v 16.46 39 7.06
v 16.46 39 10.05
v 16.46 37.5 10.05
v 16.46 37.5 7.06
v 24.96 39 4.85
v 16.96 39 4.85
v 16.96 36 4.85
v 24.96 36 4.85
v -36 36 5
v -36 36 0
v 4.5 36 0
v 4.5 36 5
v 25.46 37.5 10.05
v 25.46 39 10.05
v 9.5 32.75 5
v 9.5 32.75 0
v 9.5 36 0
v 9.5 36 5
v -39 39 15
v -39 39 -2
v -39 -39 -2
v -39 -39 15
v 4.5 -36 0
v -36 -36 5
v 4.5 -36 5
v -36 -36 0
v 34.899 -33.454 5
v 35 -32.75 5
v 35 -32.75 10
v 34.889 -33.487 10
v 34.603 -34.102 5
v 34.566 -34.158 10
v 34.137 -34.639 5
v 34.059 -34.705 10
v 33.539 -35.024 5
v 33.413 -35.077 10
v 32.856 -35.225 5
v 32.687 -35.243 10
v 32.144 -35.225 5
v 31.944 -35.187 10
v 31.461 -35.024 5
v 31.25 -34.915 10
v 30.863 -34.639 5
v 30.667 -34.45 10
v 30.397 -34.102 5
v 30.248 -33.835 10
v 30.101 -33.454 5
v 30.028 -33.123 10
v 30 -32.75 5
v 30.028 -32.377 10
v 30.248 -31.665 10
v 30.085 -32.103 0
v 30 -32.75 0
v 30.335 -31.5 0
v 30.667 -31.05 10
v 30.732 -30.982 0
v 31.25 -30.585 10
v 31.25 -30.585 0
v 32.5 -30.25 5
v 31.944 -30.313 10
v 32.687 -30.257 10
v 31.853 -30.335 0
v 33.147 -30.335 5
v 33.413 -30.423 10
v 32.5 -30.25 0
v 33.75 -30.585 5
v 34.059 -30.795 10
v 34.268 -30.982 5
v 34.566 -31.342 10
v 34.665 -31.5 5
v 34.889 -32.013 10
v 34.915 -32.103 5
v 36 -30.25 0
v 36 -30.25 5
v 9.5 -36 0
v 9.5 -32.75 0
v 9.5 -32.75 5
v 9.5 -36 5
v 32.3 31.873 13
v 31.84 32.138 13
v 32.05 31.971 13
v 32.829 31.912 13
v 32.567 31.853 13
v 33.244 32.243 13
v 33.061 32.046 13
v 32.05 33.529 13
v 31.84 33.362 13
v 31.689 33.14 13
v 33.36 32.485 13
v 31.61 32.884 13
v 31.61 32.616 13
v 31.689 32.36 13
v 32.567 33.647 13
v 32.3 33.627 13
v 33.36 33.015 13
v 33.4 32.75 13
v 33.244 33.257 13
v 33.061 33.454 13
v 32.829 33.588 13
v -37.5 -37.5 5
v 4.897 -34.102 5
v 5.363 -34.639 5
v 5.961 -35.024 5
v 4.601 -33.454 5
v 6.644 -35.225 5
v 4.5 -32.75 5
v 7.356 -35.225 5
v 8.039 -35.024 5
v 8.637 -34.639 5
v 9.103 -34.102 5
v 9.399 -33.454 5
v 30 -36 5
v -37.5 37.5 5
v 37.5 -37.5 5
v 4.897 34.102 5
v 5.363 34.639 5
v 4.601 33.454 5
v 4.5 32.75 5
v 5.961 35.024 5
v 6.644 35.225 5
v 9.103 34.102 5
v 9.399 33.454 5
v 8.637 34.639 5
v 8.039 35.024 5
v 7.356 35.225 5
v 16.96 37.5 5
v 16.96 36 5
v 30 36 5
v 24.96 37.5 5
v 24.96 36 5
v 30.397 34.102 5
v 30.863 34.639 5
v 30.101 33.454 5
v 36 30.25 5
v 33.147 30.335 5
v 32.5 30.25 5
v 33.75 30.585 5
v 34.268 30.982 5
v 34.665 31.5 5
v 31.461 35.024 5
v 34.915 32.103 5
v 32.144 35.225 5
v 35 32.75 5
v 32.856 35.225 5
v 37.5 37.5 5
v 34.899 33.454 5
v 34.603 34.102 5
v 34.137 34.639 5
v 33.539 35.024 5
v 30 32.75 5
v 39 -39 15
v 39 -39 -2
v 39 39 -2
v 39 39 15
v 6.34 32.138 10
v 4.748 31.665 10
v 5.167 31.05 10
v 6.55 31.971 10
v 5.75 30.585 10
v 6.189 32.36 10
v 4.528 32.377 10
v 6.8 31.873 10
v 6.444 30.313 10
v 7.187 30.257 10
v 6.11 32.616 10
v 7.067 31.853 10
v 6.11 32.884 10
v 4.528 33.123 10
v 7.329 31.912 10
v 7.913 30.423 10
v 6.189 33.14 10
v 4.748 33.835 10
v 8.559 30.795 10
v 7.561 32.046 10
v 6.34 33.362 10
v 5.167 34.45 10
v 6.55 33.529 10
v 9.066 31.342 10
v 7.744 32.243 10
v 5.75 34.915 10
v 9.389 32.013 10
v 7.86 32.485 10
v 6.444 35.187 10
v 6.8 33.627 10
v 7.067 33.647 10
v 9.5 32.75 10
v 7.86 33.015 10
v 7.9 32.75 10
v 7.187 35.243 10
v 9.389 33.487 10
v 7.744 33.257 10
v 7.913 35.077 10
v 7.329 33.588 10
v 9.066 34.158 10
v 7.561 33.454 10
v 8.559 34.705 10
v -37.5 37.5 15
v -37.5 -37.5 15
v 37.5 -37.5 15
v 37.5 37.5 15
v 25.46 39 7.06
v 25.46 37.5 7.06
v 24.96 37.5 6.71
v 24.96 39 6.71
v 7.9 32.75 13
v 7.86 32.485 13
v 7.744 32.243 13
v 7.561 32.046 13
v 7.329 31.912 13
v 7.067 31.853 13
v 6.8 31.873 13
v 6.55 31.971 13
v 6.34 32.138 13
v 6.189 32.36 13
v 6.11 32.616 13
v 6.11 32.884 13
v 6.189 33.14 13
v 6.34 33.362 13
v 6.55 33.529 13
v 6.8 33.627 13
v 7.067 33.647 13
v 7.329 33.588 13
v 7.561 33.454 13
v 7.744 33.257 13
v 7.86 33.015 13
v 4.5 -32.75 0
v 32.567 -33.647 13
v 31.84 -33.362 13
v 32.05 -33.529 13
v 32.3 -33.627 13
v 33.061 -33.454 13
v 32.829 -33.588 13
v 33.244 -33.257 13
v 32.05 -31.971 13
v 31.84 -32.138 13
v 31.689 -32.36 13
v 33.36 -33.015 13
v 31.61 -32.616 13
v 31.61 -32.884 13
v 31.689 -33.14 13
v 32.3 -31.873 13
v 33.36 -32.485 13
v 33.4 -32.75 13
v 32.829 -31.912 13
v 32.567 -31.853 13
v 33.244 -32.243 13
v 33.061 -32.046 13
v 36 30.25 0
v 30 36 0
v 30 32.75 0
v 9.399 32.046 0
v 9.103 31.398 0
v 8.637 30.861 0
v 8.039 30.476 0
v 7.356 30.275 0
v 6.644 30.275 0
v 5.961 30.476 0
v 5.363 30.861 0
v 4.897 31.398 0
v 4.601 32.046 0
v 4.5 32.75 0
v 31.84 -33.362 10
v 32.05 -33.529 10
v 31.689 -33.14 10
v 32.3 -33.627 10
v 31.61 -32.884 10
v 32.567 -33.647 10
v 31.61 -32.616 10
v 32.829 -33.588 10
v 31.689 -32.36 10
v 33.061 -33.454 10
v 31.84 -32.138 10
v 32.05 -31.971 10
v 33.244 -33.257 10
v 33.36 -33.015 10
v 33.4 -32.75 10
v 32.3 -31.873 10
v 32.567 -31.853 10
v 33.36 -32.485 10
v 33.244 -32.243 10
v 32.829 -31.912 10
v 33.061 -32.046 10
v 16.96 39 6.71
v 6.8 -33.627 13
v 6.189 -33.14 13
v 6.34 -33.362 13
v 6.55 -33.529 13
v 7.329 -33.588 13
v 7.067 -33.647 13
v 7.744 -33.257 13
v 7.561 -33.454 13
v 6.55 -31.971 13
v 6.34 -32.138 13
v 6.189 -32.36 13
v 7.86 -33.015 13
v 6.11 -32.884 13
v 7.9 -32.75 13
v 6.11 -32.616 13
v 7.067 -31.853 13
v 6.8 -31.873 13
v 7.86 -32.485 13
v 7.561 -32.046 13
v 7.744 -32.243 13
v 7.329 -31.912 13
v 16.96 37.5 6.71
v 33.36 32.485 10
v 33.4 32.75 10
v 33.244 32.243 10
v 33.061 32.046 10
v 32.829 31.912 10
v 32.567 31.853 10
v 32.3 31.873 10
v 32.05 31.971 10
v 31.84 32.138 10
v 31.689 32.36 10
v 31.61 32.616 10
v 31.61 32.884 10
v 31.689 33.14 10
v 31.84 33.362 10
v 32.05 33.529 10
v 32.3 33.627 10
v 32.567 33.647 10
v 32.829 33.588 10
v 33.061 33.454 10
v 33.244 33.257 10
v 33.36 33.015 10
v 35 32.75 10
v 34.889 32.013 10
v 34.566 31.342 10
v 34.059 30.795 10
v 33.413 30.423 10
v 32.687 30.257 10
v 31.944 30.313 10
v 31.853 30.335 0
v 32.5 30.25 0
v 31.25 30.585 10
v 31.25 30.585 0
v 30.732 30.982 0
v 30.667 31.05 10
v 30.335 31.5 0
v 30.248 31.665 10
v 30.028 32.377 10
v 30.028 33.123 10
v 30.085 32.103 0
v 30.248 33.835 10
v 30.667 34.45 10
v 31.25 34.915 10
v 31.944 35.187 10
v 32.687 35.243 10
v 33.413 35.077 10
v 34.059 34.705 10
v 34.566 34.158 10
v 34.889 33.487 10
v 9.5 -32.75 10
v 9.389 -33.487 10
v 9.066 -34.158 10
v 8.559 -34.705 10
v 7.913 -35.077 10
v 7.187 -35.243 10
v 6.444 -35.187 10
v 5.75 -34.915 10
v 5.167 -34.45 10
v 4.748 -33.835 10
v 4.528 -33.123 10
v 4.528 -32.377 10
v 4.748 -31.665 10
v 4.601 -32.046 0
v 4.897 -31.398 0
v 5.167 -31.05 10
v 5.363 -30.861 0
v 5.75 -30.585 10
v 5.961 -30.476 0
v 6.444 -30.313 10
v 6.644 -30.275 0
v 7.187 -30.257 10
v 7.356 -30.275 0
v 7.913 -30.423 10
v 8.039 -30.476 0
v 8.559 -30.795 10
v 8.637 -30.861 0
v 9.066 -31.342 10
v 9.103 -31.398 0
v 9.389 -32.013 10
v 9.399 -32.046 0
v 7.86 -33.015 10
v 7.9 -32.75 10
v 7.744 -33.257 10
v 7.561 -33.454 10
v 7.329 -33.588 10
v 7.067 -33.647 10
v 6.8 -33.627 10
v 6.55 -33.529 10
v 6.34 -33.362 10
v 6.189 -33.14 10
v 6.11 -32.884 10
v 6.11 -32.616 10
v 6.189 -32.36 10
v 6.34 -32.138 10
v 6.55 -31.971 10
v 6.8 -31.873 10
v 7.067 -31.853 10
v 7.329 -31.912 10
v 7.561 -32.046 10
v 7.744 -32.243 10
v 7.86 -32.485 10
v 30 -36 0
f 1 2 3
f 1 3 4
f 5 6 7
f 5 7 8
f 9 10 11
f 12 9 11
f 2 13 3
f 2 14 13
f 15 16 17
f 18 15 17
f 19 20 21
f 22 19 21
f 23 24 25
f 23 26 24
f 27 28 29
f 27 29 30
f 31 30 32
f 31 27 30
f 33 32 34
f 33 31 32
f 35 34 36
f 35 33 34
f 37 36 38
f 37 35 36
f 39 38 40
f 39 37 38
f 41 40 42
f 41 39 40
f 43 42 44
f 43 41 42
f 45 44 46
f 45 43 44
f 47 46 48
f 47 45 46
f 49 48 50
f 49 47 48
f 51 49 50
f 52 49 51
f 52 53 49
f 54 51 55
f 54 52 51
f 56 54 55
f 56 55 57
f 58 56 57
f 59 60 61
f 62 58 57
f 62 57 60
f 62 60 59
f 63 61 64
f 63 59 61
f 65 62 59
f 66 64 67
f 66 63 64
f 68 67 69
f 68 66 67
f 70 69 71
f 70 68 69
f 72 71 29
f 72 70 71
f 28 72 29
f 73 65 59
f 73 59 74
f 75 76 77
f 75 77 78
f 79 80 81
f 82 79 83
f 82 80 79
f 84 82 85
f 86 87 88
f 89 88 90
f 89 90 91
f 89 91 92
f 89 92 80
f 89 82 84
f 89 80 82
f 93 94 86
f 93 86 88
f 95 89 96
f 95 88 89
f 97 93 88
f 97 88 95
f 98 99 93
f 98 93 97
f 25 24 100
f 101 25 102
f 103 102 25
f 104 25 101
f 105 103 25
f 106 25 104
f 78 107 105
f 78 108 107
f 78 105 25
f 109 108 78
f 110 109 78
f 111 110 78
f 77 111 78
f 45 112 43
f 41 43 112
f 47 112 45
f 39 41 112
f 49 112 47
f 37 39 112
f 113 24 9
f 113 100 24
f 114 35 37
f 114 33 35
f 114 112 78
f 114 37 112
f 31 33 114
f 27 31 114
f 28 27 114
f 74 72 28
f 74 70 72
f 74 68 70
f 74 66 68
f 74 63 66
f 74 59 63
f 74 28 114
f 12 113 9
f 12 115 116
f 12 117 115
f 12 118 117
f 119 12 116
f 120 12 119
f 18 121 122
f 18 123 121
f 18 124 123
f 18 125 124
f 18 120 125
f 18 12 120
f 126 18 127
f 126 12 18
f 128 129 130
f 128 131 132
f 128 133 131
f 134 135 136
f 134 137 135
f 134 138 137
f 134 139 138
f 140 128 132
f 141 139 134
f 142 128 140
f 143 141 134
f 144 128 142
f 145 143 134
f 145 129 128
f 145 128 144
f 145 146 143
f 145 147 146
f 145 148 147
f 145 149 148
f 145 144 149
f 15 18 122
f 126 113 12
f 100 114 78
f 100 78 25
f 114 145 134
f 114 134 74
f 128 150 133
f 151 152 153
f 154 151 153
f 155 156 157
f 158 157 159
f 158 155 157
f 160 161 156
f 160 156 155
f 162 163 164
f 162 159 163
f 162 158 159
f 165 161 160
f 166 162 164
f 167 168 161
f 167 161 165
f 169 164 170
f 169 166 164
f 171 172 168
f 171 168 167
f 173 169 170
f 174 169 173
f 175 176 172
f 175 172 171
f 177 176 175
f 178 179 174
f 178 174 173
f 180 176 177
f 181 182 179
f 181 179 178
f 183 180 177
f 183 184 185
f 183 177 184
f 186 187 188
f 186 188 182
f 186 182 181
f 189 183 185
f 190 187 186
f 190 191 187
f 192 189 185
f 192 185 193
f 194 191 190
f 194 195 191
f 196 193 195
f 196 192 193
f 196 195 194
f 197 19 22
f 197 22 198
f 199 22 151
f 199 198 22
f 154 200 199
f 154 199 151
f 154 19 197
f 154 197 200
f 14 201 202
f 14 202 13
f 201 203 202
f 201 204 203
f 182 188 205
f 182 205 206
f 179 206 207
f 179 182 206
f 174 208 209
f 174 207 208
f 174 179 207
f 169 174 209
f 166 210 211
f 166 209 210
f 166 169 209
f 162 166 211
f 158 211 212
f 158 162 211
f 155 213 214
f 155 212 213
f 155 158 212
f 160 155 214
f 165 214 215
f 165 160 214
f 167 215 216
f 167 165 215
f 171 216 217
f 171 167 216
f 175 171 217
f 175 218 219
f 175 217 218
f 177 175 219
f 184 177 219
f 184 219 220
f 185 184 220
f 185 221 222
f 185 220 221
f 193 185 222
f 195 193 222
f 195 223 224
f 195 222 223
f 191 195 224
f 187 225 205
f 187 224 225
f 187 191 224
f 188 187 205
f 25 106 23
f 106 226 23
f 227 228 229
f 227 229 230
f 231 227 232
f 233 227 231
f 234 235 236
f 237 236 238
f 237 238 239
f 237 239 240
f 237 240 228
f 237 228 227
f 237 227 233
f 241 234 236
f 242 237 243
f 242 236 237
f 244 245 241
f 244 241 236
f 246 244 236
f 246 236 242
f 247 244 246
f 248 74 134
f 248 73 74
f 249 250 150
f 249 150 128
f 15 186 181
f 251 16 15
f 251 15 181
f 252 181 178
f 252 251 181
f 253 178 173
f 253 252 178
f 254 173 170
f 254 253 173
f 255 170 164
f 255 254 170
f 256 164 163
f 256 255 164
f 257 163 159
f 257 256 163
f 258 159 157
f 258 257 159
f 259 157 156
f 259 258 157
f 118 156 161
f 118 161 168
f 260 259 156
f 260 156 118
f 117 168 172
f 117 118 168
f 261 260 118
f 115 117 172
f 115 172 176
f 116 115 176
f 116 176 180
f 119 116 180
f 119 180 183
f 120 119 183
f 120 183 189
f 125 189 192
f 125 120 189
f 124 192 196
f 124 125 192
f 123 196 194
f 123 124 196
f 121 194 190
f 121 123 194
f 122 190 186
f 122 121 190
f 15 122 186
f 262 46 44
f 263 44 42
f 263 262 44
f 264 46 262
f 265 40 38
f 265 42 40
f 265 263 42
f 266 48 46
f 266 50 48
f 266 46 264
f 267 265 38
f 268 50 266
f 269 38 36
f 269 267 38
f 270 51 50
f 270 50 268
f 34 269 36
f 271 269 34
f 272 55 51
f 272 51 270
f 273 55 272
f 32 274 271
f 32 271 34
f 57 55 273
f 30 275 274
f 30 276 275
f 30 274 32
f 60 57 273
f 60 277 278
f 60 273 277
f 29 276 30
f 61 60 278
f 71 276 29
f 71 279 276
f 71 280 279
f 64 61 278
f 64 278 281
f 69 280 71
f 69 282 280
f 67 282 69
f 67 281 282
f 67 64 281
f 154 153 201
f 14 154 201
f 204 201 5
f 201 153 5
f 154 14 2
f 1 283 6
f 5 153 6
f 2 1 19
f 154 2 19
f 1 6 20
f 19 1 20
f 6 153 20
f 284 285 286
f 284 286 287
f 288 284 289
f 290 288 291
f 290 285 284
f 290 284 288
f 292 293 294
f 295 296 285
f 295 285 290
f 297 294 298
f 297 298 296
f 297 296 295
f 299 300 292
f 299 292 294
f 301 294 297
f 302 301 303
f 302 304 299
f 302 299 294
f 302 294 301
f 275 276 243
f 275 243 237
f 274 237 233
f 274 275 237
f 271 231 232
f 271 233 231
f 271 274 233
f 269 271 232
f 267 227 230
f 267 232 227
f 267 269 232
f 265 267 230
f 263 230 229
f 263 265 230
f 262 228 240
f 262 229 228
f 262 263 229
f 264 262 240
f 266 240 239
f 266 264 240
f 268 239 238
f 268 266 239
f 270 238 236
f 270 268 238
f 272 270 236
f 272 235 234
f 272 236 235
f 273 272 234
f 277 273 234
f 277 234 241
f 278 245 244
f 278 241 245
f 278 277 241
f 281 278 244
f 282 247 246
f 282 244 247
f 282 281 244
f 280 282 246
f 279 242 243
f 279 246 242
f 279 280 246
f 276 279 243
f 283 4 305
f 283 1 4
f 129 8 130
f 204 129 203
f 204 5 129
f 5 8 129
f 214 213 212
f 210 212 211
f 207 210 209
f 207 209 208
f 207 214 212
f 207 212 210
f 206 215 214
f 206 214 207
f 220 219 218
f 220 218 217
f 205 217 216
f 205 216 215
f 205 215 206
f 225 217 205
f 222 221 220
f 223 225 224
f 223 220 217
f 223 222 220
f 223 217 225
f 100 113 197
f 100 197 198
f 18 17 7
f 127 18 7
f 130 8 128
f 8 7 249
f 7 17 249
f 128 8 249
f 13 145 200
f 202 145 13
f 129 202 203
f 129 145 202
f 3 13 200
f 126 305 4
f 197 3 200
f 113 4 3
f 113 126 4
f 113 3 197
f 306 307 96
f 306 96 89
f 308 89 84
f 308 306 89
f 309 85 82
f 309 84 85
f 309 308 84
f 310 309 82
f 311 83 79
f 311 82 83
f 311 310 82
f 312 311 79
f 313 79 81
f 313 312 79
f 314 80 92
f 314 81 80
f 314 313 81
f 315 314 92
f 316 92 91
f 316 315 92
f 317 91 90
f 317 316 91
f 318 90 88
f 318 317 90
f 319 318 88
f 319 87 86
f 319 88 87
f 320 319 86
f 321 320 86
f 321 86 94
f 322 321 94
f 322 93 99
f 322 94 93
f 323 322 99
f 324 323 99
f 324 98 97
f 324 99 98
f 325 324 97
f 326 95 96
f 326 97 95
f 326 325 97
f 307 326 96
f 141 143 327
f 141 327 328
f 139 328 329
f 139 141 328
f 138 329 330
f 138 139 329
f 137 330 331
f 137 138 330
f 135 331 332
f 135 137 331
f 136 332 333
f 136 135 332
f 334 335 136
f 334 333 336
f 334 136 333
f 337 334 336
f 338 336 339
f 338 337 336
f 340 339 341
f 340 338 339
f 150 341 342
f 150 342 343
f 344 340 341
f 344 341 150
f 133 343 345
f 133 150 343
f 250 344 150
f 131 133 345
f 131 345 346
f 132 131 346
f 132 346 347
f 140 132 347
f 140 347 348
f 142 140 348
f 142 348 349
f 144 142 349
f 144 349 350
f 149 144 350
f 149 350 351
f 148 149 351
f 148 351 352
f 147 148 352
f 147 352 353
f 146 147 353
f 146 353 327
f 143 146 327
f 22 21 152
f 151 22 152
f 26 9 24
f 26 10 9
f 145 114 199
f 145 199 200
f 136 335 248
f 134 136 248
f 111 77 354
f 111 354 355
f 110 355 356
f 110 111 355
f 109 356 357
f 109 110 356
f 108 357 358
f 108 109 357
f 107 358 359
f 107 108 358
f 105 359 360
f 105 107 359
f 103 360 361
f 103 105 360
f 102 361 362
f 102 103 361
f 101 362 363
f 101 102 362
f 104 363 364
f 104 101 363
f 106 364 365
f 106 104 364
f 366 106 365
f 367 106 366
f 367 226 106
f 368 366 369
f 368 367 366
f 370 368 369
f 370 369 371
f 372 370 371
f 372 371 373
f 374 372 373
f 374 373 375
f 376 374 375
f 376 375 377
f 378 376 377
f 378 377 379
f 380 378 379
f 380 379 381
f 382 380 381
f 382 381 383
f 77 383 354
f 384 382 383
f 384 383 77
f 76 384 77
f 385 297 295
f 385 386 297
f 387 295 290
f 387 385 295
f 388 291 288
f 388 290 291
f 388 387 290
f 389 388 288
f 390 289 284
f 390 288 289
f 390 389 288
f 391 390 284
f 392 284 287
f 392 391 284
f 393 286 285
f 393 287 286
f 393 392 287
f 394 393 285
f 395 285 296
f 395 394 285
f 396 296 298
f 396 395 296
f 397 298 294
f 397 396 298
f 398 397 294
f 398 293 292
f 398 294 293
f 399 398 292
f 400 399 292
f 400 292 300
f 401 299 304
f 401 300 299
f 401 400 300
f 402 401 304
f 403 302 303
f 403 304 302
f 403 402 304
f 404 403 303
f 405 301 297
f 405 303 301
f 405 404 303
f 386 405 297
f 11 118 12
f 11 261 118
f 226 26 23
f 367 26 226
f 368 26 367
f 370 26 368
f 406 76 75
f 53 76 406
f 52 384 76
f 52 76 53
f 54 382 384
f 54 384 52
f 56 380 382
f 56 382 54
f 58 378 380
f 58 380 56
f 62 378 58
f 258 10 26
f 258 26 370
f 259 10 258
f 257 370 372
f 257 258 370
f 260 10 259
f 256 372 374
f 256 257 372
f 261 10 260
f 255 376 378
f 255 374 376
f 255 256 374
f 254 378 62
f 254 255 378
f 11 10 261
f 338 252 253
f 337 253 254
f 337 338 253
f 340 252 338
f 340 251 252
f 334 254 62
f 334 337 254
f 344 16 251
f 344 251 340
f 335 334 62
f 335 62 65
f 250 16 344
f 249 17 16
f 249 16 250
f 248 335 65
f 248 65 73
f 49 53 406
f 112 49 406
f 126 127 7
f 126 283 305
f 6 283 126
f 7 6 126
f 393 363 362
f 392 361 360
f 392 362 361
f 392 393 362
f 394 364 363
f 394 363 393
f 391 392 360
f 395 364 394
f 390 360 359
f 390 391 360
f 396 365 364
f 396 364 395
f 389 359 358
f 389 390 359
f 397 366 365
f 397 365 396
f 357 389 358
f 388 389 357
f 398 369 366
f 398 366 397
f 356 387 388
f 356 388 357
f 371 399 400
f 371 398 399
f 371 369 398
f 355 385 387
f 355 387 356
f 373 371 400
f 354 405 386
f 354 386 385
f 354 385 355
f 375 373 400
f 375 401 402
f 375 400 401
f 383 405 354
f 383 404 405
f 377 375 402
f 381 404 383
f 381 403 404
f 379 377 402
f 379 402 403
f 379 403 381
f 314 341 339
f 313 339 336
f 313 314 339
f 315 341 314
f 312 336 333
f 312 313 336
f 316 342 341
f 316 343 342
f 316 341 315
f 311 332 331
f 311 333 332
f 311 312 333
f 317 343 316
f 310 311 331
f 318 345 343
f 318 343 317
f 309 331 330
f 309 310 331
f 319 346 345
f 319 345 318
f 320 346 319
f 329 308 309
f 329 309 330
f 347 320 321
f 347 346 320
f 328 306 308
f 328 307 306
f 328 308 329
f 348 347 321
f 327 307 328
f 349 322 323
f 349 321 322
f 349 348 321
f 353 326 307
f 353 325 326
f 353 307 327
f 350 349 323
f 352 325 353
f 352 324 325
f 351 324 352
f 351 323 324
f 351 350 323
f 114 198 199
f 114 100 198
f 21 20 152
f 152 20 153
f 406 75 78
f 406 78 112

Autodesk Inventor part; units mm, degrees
ref_plane "YZ Plane" through (0, 0, 0) normal (1, 0, 0) x (0, 1, 0)
ref_plane "XZ Plane" through (0, 0, 0) normal (0, 1, 0) x (-1, 0, 0)
ref_plane "XY Plane" through (0, 0, 0) normal (0, 0, 1) x (1, 0, 0)
sketch "USB_Micro" plane through (0, 0, 0) normal (0, 0, 1) x (1, 0, 0)
  line L0 (-6.7, 3.4) -> (-6.7, 2.0438)
  line L1 (-7.2, 1.6938) -> (-6.7, 2.0438)
  line L2 (-7.2, 1.6938) -> (-7.2, 0.3)
  line L3 (-7.2, 0.3) -> (-0.3, 0.3)
  line L4 (-0.3, 0.3) -> (-0.3, 1.6938)
  line L5 (-0.8, 2.0438) -> (-0.3, 1.6938)
  line L6 (-6.7, 3.4) -> (-0.8, 3.4)
  line L7 (-0.8, 3.4) -> (-0.8, 2.0438)
  line L8 (-0.8, 0.8) -> (-6.7, 0.8)
  line L9 (-6.7, 0.8) -> (-6.7, 1.4335)
  line L10 (-6.7, 1.4335) -> (-6.2, 1.7835)
  line L11 (-6.2, 1.7835) -> (-6.2, 2.9)
  line L12 (-6.2, 2.9) -> (-1.3, 2.9)
  line L13 (-1.3, 2.9) -> (-1.3, 1.7835)
  line L14 (-1.3, 1.7835) -> (-0.8, 1.4335)
  line L15 (-0.8, 1.4335) -> (-0.8, 0.8)
  point P0 (-3.75, 0.3)
  dimension "d42" = 0.5
sketch "Skizze1" plane through (0, 0, 0) normal (0, 0, 1) x (1, 0, 0)
  line L0 (-39, -39) -> (39, -39)
  line L1 (39, -39) -> (39, 39)
  line L2 (39, 39) -> (-39, 39)
  line L3 (-39, 39) -> (-39, -39)
  line L4 (-39, -39) -> (39, 39) construction
  line L5 (39, -39) -> (-39, 39) construction
  line L6 (-37.5, -37.5) -> (37.5, -37.5)
  line L7 (37.5, -37.5) -> (37.5, 37.5)
  line L8 (37.5, 37.5) -> (-37.5, 37.5)
  line L9 (-37.5, 37.5) -> (-37.5, -37.5)
  line L10 (-37.5, -37.5) -> (37.5, 37.5) construction
  line L11 (37.5, -37.5) -> (-37.5, 37.5) construction
  line L12 (-37.5, 37.5) -> (-36, 37.5)
  line L13 (-36, 37.5) -> (-36, -37.5)
  line L14 (-36, -37.5) -> (-37.5, -37.5)
  line L15 (-37.5, -37.5) -> (-37.5, 37.5)
  line L16 (36, 37.5) -> (37.5, 37.5)
  line L17 (37.5, 37.5) -> (37.5, -37.5)
  line L18 (37.5, -37.5) -> (36, -37.5)
  line L19 (36, -37.5) -> (36, 37.5)
  line L20 (-36, -36) -> (36, -36)
  line L21 (36, -36) -> (36, -37.5)
  line L22 (36, -37.5) -> (-36, -37.5)
  line L23 (-36, -37.5) -> (-36, -36)
  line L24 (36, 37.5) -> (-36, 37.5)
  line L25 (-36, 37.5) -> (-36, 36)
  line L26 (-36, 36) -> (36, 36)
  line L27 (36, 36) -> (36, 37.5)
  point P0 (0, 0)
  dimension "d0" = 78
  dimension "d1" = 78
  dimension "d2" = 75
  dimension "d3" = 75
  dimension "d46" = 1.5
  dimension "d47" = 1.5
  dimension "d48" = 1.5
  dimension "d52" = 1.5
extrude "Extrusion1" add sketch "Skizze1" along normal blind 15
extrude "Extrusion9" add sketch "Skizze1" along normal blind 5 contours L9 L8 L13 L6 | L13 L20 L19 L6 | L19 L8 L7 L6 | L8 L19 L26 L13
extrude "Extrusion6" add sketch "Skizze1" against normal blind 2 contours L3 L2 L1 L0 | L9 L8 L13 L6 | L13 L20 L19 L6 | L19 L8 L7 L6 | L13 L26 L19 L20 | L8 L19 L26 L13
sketch "Skizze5" plane through (0, 0, 0) normal (0, 0, 1) x (1, 0, 0)
  circle A0 centre (32.5, -32.75) radius 0.9
  circle A1 centre (32.5, 32.75) radius 0.9
  circle A2 centre (7, -32.75) radius 0.9
  circle A3 centre (7, 32.75) radius 0.9
  circle A4 centre (32.5, 32.75) radius 2.5
  circle A5 centre (7, 32.75) radius 2.5
  circle A6 centre (32.5, -32.75) radius 2.5
  circle A7 centre (7, -32.75) radius 2.5
  line L0 (-54.6, 0) -> (54.6, 0) projected
  line L1 (0, -54.6) -> (0, 54.6) projected
  line L2 (36, 36) -> (36, -36) projected
  line L3 (-36, 36) -> (36, 36) projected
  line L4 (36, -36) -> (-36, -36) projected
  line L5 (9.5, 32.75) -> (9.5, 36)
  line L6 (4.5, 32.75) -> (4.5, 36)
  line L7 (4.5, 36) -> (9.5, 36)
  line L8 (30, 32.75) -> (30, 36)
  line L9 (30, 36) -> (36, 36)
  line L10 (32.5, 30.25) -> (36, 30.25)
  line L11 (36, 30.25) -> (36, 36)
  line L12 (32.5, -30.25) -> (36, -30.25)
  line L13 (36, -30.25) -> (36, -36)
  line L14 (30, -32.75) -> (30, -36)
  line L15 (30, -36) -> (36, -36)
  line L16 (9.5, -32.75) -> (9.5, -36)
  line L17 (4.5, -32.75) -> (4.5, -36)
  line L18 (4.5, -36) -> (9.5, -36)
  point P0 (0, 0)
  dimension "d28" = 1.8
  dimension "d33" = 5
  dimension "d34" = 65.5
  dimension "d35" = 25.5
  dimension "d36" = 32.5
  dimension "d37" = 32.75
  dimension "d51" = 32.75
extrude "Extrusion7" add sketch "Skizze5" along normal blind 10 contours A4 | A5 | A6 | A7
sketch "Skizze6" plane through (-39, 39, 15) normal (0, 1, 0) x (1, 0, 0)
  line L0 (63.71, 5.7) -> (56.21, 5.7) projected
  line L1 (63.71, 7.55) -> (63.71, 5.7) projected
  line L2 (63.71, 7.55) -> (63.21, 7.9) projected
  line L3 (63.21, 7.9) -> (63.21, 9.4) projected
  line L4 (56.71, 9.4) -> (63.21, 9.4) projected
  line L5 (56.71, 7.9) -> (56.71, 9.4) projected
  line L6 (56.21, 7.55) -> (56.71, 7.9) projected
  line L7 (56.21, 7.55) -> (56.21, 5.7) projected
  line L8 (56.51, 6) -> (63.41, 6) projected
  line L9 (56.51, 7.3938) -> (56.51, 6) projected
  line L10 (57.01, 7.7438) -> (56.51, 7.3938) projected
  line L11 (57.01, 9.1) -> (57.01, 7.7438) projected
  line L12 (62.91, 9.1) -> (57.01, 9.1) projected
  line L13 (62.91, 9.1) -> (62.91, 7.7438) projected
  line L14 (62.91, 7.7438) -> (63.41, 7.3938) projected
  line L15 (63.41, 7.3938) -> (63.41, 6) projected
  line L16 (64.46, 4.95) -> (55.46, 4.95)
  line L17 (55.46, 4.95) -> (55.46, 7.9405)
  line L18 (55.46, 7.9405) -> (55.96, 8.2905)
  line L19 (55.96, 8.2905) -> (55.96, 10.15)
  line L20 (55.96, 10.15) -> (63.96, 10.15)
  line L21 (63.96, 10.15) -> (63.96, 8.2905)
  line L22 (63.96, 8.2905) -> (64.46, 7.9405)
  line L23 (64.46, 7.9405) -> (64.46, 4.95)
  point P0 (39, 15)
  dimension "d45" = 0.75
extrude "Extrusion8" cut sketch "Skizze6" against normal up to surface (3 mm away) contours L0 L7 L6 L5 L4 L3 L2 L1 | L9 L10 L11 L12 L13 L14 L15 L8 | L16 L17 L18 L19 L20 L21 L22 L23
extrude "Extrusion10" add sketch "Skizze5" along normal blind 13 contours A0 | A1 | A2 | A3
extrude "Extrusion11" add sketch "Skizze5" along normal up to surface (5 mm away) contours A4 L8 L3 L2 L10 | L5 A5 L6 L3 | L2 L4 L14 A6 L12 | L17 A7 L16 L4
equation "\"d0\" = d1"
equation "\"d2\" = d3"
equation "\"d47\" = d46"
equation "\"d48\" = d46"
equation "\"d52\" = d46"
properties part number "Sensorlamp_Base"
